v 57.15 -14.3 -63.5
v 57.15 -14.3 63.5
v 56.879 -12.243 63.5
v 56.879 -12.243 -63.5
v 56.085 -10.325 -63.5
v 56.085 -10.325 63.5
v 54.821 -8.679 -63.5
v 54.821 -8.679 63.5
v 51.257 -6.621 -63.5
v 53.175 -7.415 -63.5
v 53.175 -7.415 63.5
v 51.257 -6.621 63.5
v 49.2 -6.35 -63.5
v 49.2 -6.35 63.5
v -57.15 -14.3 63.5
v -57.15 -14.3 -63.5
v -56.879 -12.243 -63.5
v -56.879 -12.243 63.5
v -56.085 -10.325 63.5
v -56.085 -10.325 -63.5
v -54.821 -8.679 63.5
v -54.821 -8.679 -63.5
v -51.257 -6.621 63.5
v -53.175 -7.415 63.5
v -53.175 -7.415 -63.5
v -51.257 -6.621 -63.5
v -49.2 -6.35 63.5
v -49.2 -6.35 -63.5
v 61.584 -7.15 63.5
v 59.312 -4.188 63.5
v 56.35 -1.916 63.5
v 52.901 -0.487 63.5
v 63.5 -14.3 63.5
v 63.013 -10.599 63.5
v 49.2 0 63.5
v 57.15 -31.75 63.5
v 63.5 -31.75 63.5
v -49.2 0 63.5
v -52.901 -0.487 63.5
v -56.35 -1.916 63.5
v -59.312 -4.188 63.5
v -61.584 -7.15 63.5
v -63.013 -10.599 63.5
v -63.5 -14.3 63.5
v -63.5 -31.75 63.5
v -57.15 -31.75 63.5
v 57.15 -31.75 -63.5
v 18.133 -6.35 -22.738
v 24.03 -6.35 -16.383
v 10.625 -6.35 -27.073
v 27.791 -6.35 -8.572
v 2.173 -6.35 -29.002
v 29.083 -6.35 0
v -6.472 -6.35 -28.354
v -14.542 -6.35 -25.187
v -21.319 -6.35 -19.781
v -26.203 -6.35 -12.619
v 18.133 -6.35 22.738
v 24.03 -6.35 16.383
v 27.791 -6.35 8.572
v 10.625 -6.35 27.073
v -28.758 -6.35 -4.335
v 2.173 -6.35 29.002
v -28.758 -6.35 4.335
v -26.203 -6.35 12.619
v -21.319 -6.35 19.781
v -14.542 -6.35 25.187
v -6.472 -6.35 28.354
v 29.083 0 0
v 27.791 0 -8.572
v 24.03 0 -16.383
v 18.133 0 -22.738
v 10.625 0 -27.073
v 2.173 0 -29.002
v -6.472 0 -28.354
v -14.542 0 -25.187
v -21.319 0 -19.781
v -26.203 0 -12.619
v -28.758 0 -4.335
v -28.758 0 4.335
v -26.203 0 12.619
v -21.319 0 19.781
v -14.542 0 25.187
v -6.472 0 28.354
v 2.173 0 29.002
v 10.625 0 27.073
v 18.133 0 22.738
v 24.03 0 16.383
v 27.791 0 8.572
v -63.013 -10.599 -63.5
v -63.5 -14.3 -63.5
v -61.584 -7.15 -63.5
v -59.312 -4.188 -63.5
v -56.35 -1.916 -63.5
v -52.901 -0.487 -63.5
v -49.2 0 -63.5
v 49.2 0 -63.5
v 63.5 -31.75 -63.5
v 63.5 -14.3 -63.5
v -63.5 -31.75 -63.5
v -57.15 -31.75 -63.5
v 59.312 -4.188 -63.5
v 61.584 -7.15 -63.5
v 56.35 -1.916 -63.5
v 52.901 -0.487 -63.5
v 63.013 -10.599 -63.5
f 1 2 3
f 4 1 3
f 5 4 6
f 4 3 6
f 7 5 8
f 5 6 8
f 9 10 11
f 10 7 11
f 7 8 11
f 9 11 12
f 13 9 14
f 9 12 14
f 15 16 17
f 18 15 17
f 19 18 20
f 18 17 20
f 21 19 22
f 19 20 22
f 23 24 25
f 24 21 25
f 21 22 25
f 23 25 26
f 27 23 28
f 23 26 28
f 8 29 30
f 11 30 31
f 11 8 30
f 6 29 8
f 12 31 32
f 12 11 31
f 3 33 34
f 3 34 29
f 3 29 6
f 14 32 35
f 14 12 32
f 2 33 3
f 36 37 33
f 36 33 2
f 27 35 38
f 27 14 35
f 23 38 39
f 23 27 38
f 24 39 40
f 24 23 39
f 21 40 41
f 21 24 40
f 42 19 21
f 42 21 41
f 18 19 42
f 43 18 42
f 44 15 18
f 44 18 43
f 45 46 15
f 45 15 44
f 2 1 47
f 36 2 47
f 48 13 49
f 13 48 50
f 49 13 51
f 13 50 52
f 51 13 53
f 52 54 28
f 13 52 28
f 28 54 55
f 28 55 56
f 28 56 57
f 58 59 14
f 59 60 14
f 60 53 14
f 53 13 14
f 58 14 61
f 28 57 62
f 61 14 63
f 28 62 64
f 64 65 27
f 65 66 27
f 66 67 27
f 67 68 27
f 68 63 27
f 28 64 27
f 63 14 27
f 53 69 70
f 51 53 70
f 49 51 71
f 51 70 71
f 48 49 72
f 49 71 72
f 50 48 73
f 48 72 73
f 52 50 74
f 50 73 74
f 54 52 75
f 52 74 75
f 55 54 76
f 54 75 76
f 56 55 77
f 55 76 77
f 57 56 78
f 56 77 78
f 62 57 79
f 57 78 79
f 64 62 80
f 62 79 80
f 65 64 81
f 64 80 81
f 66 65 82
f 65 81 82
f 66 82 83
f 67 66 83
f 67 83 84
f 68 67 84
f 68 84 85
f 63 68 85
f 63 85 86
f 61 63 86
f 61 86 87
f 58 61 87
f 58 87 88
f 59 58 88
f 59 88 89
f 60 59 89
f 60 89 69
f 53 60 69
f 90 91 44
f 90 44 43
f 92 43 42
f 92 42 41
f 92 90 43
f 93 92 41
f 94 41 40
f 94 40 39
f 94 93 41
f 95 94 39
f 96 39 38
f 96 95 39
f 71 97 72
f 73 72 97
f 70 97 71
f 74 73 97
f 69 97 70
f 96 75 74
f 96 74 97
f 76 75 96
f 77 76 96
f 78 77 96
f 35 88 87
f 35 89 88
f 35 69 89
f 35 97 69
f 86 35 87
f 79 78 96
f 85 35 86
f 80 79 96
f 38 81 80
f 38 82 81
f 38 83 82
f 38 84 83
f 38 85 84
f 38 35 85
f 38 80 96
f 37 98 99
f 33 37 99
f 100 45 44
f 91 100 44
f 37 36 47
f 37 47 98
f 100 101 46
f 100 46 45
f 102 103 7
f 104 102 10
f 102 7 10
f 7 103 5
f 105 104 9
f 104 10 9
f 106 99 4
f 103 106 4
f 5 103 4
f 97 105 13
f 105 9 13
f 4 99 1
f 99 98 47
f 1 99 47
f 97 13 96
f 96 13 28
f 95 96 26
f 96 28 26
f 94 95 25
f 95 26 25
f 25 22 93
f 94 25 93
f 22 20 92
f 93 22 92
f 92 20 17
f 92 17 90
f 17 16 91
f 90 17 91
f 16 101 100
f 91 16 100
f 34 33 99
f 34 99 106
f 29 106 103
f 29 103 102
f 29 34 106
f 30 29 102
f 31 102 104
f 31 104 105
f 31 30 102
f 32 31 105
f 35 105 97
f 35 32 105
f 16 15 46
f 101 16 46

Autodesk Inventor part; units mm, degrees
ref_plane "YZ Plane" through (0, 0, 0) normal (1, 0, 0) x (0, 1, 0)
ref_plane "XZ Plane" through (0, 0, 0) normal (0, 1, 0) x (-1, 0, 0)
ref_plane "XY Plane" through (0, 0, 0) normal (0, 0, 1) x (1, 0, 0)
sketch "Sketch4" plane through (0, 0, 0) normal (0, 1, 0) x (-1, 0, 0)
  line L0 (-63.5, 63.5) -> (63.5, 63.5)
  line L1 (63.5, 63.5) -> (63.5, -63.5)
  line L2 (63.5, -63.5) -> (-63.5, -63.5)
  line L3 (-63.5, -63.5) -> (-63.5, 63.5)
  line L4 (-63.5, 63.5) -> (63.5, -63.5) construction
  line L5 (63.5, 63.5) -> (-63.5, -63.5) construction
  point P0 (0, 0)
  dimension "d6" = 127
  dimension "d7" = 127
extrude "Plate1" add sketch "Sketch4" against normal blind 6.35
sketch "Sketch5" plane through (57.15, 0, -63.5) normal (1, 0, 0) x (0, -1, 0)
  line L0 (0, 127) -> (0, 0)
  line L1 (0, 0) -> (31.75, 0)
  line L2 (31.75, 0) -> (31.75, 127)
  line L3 (31.75, 127) -> (0, 127)
edge flange "Flange1" height 31.75 angle 90 thickness 6.35 bend radius 7.9502 thickness toward (1, 0, 0) relief tear relief width 6.35 relief depth 3.175 corner gap 6.35 corner form 0 edges at (63.5, 0, 0) (-63.5, 0, 0) wall of the first edge with corners at (57.15, 0, 63.5) (57.15, 0, -63.5) (57.15, -31.75, -63.5) (57.15, -31.75, 63.5)
bend "Bend1"
corner "Corner1"
sketch "Sketch6" plane through (0, 0, 0) normal (0, 1, 0) x (1, 0, 0)
  circle A0 centre (0, 0) radius 29.083
  dimension "d19" = 58.166
extrude "Cut1" cut sketch "Sketch6" against normal blind 6.35
equation "\"d20\" = Thickness"
equation "\"d8\" = Thickness"
equation "\"d9\" = BendReliefWidth"
equation "\"d10\" = BendReliefDepth"
equation "\"d11\" = MinimumRemnant"
equation "\"d12\" = TransitionRadius"
equation "\"d15\" = BendRadius"
equation "\"d16\" = CornerReliefSize"
equation "\"d17\" = GapSize"
equation "\"d18\" = JacobiRadiusSize"
equation "\"BendReliefWidth\" = Thickness"
equation "\"BendReliefDepth\" = 0.5 * Thickness"
equation "\"CornerReliefSize\" = 4 * Thickness"
equation "\"MinimumRemnant\" = 2 * Thickness"
equation "\"TransitionRadius\" = BendRadius"
equation "\"JacobiRadiusSize\" = Thickness"
equation "\"GapSize\" = Thickness"
equation "\"Thickness\" = 6.35"
equation "\"BendRadius\" = 7.9502"
properties part number "Gooseneck Model-1 Sheet-2" material "SS304"
